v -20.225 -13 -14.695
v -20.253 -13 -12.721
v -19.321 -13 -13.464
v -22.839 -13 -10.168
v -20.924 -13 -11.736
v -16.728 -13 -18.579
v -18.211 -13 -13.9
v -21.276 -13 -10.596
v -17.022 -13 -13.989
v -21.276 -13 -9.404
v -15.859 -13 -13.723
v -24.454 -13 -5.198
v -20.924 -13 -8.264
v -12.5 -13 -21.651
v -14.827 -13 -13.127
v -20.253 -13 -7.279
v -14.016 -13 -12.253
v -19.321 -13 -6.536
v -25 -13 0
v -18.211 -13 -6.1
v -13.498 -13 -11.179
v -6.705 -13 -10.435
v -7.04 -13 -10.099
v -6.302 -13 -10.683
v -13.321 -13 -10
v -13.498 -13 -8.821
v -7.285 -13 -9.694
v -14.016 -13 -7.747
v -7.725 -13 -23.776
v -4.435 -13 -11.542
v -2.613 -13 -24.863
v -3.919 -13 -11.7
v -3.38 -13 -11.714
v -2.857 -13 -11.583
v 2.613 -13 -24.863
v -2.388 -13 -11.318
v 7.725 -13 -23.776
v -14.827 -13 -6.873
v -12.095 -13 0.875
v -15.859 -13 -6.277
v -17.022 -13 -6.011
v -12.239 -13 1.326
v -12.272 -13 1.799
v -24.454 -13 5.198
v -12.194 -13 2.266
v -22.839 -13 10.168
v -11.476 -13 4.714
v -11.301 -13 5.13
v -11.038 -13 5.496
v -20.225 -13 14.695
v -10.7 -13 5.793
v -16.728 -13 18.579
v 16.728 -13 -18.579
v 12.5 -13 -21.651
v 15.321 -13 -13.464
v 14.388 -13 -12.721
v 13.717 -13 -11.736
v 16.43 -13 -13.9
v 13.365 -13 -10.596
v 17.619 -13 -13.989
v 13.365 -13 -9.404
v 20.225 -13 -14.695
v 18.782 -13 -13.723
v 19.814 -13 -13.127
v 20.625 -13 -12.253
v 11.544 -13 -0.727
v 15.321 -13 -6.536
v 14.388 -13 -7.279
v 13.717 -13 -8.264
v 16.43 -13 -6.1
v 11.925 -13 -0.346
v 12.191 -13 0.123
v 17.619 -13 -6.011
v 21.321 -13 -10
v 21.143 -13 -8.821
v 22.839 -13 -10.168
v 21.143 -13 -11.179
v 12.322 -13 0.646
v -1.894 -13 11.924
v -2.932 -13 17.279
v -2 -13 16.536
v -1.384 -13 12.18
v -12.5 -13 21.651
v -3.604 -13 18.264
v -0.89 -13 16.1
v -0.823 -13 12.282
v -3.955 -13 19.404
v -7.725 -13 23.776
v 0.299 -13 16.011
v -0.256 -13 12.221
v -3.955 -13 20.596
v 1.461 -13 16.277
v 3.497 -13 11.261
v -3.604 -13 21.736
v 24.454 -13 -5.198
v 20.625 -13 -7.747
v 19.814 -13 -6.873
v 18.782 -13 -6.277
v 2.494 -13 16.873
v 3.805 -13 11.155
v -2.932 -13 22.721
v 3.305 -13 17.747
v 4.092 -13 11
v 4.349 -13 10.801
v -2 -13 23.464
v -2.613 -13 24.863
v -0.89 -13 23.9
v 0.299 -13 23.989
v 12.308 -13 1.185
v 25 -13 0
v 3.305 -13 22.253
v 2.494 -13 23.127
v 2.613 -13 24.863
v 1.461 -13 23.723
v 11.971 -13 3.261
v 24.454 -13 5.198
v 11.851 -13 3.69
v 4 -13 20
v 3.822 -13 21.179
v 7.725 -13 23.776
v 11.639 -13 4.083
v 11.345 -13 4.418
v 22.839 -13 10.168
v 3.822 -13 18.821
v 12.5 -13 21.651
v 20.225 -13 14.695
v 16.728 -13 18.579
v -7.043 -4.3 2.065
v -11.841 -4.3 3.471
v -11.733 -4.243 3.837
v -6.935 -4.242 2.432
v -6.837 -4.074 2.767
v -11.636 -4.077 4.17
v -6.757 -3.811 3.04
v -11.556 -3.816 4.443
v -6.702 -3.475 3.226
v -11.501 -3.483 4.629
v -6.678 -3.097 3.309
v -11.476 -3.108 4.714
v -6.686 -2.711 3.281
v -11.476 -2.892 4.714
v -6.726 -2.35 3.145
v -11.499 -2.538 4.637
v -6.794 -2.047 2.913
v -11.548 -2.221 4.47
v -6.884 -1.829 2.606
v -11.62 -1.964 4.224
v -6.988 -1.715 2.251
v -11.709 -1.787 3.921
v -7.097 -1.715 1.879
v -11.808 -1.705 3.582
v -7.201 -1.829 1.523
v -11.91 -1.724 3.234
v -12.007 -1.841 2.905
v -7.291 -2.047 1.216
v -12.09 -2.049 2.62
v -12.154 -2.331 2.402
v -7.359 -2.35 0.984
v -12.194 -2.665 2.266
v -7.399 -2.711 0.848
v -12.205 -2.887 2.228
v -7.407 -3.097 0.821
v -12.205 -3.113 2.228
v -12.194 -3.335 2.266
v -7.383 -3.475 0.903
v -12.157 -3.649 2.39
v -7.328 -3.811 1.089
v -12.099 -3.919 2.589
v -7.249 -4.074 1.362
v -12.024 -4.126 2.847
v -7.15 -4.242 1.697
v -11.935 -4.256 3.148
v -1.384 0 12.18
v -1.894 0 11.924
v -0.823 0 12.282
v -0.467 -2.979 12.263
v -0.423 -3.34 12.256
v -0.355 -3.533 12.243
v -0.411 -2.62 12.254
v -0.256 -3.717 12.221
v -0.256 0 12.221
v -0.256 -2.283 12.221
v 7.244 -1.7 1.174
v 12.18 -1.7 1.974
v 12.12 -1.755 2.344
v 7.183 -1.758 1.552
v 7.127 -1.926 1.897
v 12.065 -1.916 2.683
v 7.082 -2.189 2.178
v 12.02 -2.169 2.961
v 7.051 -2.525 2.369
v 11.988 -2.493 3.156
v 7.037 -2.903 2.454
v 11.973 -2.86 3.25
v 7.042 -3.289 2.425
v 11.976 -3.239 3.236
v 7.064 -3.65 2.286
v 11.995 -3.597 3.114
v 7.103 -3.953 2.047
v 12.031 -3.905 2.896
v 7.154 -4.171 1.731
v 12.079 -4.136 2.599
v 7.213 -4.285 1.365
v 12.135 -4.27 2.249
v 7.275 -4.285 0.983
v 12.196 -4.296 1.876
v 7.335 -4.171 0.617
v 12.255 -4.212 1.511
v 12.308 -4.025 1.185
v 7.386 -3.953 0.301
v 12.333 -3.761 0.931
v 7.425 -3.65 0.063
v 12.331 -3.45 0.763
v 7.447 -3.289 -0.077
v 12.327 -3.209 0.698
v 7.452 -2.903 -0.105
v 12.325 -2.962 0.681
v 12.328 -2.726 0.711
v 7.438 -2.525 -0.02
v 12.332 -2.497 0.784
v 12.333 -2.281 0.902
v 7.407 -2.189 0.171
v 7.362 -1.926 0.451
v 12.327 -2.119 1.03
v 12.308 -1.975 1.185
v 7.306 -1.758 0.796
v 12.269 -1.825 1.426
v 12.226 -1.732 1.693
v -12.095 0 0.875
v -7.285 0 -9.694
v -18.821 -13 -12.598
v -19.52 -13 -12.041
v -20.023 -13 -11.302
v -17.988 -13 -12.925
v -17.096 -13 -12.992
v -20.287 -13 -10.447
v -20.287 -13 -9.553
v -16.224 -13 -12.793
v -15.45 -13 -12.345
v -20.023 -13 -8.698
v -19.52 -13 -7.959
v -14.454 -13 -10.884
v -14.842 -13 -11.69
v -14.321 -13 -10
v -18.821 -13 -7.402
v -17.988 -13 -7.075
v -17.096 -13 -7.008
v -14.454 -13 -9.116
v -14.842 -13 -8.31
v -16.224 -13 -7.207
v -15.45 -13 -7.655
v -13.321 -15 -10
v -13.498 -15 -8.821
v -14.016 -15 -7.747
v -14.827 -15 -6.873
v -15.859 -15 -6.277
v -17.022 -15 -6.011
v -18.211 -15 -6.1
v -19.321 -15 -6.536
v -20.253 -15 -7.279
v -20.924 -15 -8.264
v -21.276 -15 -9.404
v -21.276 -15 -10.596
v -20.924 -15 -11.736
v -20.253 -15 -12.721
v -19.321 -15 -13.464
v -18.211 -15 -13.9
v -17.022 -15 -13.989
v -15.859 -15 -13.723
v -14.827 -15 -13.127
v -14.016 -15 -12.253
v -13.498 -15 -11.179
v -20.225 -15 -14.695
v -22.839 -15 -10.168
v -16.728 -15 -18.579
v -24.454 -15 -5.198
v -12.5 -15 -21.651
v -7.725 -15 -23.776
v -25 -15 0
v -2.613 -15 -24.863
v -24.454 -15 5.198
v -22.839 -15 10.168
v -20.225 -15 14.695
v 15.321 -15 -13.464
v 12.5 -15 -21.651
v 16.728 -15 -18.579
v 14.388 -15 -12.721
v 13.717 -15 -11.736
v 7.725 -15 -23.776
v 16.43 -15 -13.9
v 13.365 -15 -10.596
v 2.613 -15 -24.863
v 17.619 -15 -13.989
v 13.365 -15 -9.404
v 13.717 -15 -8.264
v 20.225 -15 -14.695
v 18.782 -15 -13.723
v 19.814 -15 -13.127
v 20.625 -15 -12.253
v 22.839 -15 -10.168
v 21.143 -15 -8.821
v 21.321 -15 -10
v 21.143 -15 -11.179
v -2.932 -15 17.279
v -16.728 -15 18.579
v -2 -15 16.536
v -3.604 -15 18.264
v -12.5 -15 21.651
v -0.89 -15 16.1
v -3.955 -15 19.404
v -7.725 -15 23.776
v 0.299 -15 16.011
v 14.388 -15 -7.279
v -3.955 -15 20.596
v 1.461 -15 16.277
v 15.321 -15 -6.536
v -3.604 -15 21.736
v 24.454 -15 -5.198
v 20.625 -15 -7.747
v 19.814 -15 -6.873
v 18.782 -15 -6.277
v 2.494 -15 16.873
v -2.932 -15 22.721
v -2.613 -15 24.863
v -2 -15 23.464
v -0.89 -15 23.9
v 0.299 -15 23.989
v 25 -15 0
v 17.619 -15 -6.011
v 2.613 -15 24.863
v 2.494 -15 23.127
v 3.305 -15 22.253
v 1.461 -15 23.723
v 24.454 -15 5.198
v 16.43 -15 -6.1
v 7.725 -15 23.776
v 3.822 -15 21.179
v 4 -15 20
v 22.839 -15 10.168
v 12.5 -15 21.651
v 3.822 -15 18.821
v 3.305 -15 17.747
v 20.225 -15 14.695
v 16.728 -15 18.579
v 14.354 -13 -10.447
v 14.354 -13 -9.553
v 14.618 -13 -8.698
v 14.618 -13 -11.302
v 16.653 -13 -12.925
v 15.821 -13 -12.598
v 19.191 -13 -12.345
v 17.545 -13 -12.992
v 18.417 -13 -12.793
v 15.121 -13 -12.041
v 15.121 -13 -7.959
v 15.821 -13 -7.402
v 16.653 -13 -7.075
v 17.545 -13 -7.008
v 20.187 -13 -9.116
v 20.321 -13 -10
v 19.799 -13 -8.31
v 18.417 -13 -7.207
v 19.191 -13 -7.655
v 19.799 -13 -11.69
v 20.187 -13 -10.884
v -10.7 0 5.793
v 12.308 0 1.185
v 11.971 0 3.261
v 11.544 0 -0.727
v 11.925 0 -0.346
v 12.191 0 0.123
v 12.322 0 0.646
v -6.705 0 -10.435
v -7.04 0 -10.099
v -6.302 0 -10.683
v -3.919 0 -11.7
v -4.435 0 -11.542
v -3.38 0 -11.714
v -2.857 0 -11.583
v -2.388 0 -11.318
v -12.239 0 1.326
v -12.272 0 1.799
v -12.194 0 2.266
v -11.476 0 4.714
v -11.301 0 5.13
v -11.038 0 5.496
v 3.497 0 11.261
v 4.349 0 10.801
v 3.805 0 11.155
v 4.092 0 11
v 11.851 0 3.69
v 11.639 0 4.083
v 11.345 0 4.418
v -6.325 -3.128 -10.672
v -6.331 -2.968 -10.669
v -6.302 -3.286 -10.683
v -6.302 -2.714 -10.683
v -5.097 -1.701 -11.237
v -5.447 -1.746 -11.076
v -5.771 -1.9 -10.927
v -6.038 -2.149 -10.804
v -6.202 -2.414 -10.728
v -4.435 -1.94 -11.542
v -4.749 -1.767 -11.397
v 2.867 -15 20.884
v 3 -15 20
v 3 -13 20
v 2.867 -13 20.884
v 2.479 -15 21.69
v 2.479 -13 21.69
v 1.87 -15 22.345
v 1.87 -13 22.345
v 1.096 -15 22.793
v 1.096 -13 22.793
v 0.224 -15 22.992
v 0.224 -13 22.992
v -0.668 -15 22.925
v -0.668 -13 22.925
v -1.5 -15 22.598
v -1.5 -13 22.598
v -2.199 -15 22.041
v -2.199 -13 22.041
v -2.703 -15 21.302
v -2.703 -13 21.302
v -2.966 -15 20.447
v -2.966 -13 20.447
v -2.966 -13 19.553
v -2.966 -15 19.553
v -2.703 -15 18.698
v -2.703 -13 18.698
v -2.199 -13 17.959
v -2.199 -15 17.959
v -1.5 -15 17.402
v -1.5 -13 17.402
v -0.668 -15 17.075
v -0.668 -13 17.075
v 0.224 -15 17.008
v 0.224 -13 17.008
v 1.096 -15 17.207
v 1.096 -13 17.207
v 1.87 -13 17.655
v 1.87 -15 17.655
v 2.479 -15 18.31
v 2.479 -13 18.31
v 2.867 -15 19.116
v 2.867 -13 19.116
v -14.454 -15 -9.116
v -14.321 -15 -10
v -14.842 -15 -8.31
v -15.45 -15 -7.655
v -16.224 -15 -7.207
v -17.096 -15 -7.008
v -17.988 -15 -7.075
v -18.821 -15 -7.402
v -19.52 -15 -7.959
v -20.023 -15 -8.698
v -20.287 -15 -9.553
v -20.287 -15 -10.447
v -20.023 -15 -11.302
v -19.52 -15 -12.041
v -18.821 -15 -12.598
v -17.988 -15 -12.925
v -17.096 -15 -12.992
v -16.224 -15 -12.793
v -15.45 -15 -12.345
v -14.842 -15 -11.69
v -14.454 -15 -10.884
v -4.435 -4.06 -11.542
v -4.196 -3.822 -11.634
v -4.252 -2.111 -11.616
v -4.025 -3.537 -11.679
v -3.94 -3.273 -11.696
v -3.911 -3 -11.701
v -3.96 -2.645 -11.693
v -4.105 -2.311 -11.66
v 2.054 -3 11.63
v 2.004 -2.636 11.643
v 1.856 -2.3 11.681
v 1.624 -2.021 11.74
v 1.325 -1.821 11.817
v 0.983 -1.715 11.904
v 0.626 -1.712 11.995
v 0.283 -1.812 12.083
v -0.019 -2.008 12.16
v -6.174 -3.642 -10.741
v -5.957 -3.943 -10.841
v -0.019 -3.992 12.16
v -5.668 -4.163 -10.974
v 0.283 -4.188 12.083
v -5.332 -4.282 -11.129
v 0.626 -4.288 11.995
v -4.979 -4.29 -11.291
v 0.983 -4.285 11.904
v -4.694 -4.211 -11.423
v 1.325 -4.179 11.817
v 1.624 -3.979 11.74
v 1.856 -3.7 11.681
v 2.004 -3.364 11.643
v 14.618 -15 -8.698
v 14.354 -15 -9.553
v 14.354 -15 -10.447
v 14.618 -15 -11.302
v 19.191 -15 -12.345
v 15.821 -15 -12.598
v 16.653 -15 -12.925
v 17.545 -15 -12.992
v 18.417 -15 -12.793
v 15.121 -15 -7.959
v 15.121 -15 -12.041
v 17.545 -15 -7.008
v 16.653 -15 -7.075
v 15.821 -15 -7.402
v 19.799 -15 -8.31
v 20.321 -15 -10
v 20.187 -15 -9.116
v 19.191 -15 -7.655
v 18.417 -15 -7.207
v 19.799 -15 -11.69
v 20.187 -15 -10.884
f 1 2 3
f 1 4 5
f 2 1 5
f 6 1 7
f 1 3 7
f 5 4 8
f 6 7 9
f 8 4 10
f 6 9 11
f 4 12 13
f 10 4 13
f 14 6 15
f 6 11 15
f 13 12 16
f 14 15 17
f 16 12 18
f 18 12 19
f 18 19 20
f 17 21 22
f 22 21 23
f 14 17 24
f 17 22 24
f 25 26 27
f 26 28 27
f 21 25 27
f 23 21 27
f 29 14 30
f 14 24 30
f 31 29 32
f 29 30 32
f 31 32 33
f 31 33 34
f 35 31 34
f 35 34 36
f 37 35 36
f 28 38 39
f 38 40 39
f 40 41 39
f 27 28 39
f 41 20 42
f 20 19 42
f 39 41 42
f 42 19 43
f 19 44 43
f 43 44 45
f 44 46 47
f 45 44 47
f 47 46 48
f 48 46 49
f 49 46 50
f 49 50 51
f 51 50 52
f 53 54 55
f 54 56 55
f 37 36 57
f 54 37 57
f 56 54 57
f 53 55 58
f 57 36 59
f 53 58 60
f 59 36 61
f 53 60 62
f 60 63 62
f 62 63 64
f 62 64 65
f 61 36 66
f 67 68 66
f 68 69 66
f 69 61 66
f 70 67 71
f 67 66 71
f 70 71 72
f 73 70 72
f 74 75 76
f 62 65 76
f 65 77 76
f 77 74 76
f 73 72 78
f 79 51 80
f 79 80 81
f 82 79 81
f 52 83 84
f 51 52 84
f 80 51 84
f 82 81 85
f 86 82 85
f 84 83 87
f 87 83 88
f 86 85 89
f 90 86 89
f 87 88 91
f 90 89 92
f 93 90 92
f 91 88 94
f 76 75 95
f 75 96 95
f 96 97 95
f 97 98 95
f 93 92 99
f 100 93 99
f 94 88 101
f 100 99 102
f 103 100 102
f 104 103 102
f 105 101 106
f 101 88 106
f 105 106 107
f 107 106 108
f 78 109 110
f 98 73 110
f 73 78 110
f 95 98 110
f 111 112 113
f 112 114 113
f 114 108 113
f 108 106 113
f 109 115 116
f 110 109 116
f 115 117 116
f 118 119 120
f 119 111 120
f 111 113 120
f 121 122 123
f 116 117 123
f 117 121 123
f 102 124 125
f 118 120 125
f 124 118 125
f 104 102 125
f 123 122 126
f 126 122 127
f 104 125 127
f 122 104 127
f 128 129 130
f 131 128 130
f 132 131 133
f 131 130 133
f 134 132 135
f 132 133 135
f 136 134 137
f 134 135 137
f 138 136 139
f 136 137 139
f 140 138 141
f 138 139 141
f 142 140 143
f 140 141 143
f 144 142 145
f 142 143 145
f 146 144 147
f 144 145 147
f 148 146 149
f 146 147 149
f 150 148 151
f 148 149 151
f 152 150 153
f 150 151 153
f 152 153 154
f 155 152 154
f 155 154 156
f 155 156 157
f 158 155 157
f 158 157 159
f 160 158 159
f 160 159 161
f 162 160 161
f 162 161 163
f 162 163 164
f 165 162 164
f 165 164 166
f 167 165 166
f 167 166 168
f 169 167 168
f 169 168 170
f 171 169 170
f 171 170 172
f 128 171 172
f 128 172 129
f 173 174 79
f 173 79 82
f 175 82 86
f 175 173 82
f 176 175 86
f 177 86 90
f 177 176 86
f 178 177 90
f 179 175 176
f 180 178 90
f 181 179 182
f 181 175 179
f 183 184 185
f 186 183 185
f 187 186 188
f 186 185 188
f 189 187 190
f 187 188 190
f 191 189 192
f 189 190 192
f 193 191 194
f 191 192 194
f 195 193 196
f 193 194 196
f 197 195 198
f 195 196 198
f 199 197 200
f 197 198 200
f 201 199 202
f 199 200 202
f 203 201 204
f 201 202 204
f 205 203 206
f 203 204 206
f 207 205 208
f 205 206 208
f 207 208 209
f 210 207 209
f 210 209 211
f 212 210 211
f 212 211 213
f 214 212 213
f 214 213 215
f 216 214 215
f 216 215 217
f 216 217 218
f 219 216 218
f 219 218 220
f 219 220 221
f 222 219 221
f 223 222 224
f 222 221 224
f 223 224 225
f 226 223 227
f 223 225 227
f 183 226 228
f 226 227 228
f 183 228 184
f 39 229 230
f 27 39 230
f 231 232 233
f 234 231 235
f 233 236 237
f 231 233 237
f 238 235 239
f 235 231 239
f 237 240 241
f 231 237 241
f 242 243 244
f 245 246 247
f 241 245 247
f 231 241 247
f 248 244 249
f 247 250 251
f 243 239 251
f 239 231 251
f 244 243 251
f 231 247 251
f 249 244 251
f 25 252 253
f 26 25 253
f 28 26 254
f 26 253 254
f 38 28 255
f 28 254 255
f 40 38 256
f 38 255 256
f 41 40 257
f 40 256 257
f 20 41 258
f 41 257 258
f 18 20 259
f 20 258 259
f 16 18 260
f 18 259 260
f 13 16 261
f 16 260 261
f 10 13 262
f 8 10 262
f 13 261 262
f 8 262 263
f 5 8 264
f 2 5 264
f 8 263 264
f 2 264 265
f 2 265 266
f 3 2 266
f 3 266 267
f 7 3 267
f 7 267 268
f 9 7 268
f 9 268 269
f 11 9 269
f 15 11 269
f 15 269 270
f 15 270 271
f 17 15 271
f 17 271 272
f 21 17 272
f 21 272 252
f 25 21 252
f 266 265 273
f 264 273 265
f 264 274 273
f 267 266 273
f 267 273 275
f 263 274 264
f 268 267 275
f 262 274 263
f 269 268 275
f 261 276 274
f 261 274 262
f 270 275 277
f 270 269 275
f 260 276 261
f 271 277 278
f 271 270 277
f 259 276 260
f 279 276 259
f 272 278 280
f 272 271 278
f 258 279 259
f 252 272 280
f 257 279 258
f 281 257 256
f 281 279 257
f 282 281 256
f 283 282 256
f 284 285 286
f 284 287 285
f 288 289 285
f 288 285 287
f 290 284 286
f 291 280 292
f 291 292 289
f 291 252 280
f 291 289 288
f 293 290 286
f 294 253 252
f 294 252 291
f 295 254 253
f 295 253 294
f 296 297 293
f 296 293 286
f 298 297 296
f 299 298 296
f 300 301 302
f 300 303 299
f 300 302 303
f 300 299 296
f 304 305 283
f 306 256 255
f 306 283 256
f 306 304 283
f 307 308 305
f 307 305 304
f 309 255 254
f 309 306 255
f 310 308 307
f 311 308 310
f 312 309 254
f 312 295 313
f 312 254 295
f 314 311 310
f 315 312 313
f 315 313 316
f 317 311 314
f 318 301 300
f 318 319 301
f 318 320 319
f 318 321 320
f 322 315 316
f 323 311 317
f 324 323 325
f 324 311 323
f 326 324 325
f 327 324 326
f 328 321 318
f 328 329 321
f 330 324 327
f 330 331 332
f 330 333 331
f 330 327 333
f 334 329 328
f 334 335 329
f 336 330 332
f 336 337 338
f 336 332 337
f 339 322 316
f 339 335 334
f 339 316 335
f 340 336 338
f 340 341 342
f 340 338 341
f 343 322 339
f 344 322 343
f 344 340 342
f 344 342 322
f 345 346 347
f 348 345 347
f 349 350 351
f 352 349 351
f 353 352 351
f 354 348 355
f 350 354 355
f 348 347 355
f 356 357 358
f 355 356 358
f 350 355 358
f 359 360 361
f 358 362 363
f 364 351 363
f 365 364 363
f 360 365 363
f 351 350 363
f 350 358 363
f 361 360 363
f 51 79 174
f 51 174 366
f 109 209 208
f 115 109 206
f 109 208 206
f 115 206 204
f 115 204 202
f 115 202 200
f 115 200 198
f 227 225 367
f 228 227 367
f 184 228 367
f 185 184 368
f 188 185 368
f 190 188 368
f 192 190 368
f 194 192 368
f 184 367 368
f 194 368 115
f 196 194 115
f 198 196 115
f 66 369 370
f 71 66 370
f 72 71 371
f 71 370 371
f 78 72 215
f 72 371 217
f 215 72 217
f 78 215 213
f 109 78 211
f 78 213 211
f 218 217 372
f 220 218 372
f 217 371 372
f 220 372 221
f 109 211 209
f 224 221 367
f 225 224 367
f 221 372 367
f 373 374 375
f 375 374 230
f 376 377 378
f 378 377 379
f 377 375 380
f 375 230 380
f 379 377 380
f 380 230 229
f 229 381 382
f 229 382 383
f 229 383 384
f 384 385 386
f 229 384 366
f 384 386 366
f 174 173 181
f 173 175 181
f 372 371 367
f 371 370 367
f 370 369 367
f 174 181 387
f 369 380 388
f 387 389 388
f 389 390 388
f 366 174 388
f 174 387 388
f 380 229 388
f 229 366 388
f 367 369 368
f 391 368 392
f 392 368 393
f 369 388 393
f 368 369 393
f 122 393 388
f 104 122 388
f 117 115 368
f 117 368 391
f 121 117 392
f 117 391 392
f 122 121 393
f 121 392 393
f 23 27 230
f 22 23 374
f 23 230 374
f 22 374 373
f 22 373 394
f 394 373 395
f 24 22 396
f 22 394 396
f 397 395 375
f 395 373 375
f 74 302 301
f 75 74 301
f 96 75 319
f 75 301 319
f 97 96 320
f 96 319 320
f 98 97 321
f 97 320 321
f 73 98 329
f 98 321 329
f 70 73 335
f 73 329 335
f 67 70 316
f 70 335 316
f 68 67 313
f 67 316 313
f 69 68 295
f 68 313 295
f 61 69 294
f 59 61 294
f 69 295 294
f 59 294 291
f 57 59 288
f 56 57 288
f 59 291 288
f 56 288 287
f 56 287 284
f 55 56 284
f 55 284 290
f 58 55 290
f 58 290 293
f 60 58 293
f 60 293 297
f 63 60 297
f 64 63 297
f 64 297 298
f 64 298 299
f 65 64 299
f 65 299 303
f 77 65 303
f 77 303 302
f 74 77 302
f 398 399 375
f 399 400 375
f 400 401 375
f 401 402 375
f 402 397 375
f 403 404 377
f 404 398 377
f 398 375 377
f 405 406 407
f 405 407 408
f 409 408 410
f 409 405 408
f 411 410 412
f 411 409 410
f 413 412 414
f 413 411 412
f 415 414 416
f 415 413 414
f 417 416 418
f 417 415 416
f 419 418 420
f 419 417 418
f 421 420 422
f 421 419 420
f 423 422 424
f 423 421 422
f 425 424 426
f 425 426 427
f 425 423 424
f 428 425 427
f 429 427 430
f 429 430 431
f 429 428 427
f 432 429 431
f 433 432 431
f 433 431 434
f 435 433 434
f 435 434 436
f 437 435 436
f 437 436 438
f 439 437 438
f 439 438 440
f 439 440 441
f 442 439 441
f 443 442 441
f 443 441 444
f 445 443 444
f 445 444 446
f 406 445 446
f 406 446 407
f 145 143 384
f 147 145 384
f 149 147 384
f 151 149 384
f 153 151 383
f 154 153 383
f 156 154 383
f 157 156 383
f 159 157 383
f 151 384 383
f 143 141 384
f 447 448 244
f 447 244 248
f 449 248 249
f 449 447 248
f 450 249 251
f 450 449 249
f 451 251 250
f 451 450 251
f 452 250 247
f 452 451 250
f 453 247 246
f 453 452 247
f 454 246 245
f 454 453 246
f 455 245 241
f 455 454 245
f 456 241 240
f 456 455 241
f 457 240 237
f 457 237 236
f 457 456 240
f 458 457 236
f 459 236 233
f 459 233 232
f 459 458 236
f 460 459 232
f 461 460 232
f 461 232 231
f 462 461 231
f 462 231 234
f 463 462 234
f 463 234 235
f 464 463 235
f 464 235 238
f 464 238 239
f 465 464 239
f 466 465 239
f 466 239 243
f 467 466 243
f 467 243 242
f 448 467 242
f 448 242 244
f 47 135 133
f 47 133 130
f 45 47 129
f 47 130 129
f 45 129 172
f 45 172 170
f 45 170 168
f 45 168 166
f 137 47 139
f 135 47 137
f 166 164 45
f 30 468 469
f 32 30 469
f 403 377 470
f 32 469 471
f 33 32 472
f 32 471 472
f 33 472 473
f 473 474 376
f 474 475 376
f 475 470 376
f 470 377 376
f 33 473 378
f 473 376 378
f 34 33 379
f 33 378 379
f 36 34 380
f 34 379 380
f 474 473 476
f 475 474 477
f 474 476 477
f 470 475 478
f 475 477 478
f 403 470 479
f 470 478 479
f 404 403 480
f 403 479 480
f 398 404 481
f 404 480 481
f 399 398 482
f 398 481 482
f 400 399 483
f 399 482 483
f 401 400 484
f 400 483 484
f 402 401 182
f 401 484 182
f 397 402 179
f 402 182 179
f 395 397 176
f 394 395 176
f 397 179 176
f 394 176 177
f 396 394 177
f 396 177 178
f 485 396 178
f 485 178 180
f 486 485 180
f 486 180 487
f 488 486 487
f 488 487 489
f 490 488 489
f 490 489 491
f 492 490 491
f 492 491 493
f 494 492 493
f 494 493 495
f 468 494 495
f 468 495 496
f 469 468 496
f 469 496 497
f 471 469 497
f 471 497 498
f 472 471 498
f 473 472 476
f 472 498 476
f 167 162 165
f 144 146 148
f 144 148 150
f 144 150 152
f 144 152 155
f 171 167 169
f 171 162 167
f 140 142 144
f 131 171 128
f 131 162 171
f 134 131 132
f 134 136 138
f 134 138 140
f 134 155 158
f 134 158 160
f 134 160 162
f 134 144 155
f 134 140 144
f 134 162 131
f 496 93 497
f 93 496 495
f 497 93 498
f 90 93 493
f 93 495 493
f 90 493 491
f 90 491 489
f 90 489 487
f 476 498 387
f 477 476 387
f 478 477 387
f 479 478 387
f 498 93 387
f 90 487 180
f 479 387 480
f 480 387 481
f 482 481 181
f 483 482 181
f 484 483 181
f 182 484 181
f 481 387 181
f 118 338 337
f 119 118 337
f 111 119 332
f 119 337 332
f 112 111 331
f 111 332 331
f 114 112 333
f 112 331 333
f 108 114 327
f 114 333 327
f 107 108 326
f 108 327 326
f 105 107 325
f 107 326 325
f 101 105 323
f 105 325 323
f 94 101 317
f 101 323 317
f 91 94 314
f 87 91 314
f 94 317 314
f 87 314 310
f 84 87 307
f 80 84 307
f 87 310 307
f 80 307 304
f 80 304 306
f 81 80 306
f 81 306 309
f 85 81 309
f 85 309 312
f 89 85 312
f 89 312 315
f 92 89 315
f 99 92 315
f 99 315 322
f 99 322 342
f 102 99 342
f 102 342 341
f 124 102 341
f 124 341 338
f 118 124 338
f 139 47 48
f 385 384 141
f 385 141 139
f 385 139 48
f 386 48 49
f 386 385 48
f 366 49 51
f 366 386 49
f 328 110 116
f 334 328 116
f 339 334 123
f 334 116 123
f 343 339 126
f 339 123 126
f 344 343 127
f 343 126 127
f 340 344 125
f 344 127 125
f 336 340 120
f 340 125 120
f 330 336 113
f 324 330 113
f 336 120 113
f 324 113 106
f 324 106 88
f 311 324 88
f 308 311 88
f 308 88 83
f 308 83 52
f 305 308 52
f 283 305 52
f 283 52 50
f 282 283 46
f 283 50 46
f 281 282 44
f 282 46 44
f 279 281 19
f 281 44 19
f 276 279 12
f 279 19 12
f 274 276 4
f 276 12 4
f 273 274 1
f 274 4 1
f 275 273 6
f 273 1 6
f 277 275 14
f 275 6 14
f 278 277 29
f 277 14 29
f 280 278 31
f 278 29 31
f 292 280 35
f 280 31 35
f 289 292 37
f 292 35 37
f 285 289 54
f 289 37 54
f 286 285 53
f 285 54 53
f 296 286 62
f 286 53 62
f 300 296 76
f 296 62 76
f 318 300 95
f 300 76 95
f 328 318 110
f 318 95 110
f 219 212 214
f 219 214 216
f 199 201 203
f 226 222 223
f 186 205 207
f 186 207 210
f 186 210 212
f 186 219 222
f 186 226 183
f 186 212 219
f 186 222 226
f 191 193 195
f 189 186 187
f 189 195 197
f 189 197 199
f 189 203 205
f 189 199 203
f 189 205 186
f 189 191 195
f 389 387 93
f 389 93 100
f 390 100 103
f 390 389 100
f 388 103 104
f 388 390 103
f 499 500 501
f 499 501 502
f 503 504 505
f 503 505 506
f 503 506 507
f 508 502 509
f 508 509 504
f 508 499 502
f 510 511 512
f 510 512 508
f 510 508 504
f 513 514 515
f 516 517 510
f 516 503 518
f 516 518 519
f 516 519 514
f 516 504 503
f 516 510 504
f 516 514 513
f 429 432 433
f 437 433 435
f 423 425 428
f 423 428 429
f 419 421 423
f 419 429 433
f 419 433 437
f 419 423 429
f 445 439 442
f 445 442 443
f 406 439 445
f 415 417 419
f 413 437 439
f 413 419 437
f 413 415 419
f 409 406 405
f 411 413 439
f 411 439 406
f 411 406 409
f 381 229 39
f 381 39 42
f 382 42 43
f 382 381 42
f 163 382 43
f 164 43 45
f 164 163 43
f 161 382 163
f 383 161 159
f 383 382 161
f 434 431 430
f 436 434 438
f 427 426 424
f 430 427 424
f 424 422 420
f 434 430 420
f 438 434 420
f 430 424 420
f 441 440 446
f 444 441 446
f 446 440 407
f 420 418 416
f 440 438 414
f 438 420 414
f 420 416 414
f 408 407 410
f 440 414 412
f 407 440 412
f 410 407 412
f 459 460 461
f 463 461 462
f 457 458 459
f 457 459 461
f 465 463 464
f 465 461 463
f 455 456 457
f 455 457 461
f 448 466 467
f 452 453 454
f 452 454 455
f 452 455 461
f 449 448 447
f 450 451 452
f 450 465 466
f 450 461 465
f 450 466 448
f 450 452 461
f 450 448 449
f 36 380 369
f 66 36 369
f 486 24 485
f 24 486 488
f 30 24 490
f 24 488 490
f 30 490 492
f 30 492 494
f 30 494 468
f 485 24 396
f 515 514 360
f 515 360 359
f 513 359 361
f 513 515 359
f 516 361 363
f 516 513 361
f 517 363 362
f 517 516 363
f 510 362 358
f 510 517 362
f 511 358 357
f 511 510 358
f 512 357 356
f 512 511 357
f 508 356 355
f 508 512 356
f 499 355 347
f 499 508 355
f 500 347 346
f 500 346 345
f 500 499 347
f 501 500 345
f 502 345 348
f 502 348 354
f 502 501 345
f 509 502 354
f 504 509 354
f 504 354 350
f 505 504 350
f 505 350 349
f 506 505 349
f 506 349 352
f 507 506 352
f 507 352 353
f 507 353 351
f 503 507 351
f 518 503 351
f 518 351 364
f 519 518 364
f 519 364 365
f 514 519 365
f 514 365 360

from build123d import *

# Parameters (mm, degrees)
F1_DEPTH      = 13
F2_R          = 1.3
F3_DEPTH      = 5
F4_R          = 1.3
F5_DEPTH      = 25
F6_R          = 1.3
F7_DEPTH      = 5
F8_R          = 25
F9_DEPTH      = 2
F10_R         = 4
F10_R_2       = 3
F11_DEPTH     = 80
F12_T1_DEPTH  = 16.002243982
F12_T3_DEPTH  = 14.8598729542
F12_T5_DEPTH  = 14.7613040686
F12_T7_DEPTH  = 15.2887647241
F12_T9_DEPTH  = 14.7419723435
F12_T11_DEPTH = 14.2482473807


# Not quite as in the source:
# - a fillet or chamfer that OpenCascade refuses, or shapes differently, is made with other operations: its cross-section is extruded or revolved along the edge and cut away or added


with BuildPart() as f1:
    # F0 (on Front) → F1 (new body)
    with BuildSketch(Plane.XZ):
        Polygon((-3.34402165, -12.0443978349), (12.5, 0), (11.86, 3.9484680574), (3.9804532583, 11.1376835822), (-1.1429031284, 12.44764124), (-11.2779609495, 5.390509885), (-12.4032698364, 1.552062294), (-6.9773613512, -10.3714236522), align=None)
    extrude(amount=F1_DEPTH)

    # F2 (on face) → F3 (cut)
    with BuildSketch(Plane(origin=(12.18, 0, 1.9742340287), x_dir=(0, 1, 0), z_dir=(0.9871170143, 0, 0.16))):
        with Locations((-3, 0)):
            Circle(F2_R)
    extrude(amount=-F3_DEPTH, mode=Mode.SUBTRACT)

    # F4 (on face) → F5 (cut)
    with BuildSketch(Plane(origin=(2.9172291114, 0, 11.4095324461), x_dir=(0.9688330447, 0, -0.2477146172), z_dir=(0.2477146172, 0, 0.9688330447))):
        with Locations((-2.1907450021, -3)):
            Circle(F4_R)
    extrude(amount=-F5_DEPTH, mode=Mode.SUBTRACT)

    # F6 (on face) → F7 (cut)
    with BuildSketch(Plane(origin=(-11.840615393, 0, 3.4712860895), x_dir=(0, -1, 0), z_dir=(-0.9596118978, 0, 0.2813272217))):
        with Locations((3, 0)):
            Circle(F6_R)
    extrude(amount=-F7_DEPTH, mode=Mode.SUBTRACT)

    # F8 (on face) → F9 (join)
    with BuildSketch(Plane.XZ.offset(13)):
        Circle(F8_R)
    extrude(amount=F9_DEPTH)

    # F10 (on face) → F11 (cut)
    with BuildSketch(Plane.XZ.offset(15)):
        with Locations((0, 20)):
            Circle(F10_R)
        with Locations((0, 20)):
            Circle(F10_R_2, mode=Mode.SUBTRACT)
        with Locations((17.3205080757, -10)):
            Circle(F10_R)
        with Locations((17.3205080757, -10)):
            Circle(F10_R_2, mode=Mode.SUBTRACT)
        with Locations((-17.3205080757, -10)):
            Circle(F10_R)
        with Locations((-17.3205080757, -10)):
            Circle(F10_R_2, mode=Mode.SUBTRACT)
    extrude(amount=-F11_DEPTH, mode=Mode.SUBTRACT)

    # F12: fillet of radius 2 on 8 edges, made by hand

    # F12_s2 → F12_t1 (cut)
    with BuildSketch(Plane.XZ.offset(-3.002243982)):
        with BuildLine():
            ThreePointArc((-4.4348388753, -11.5421301677), (-3.3803086774, -11.7135390891), (-2.3879978952, -11.3176422991))
            Line((-2.3879978952, -11.3176422991), (-3.34402165, -12.0443978349))
            Line((-3.34402165, -12.0443978349), (-4.4348388753, -11.5421301677))
        make_face()
        with BuildLine():
            ThreePointArc((11.5439762452, -0.7267555357), (12.1909080195, 0.1234763362), (12.3078563852, 1.1854264463))
            Line((12.3078563852, 1.1854264463), (12.5, 0))
            Line((12.5, 0), (11.5439762452, -0.7267555357))
        make_face()
    extrude(amount=F12_T1_DEPTH, mode=Mode.SUBTRACT)

    # F12_s4 → F12_t3 (cut)
    with BuildSketch(Plane.XZ.offset(-1.8598729542)):
        with BuildLine():
            ThreePointArc((-7.2854987693, -9.69428872), (-6.8824804468, -10.2769646373), (-6.3016063269, -10.6825755958))
            Line((-6.3016063269, -10.6825755958), (-6.9773613512, -10.3714236522))
            Line((-6.9773613512, -10.3714236522), (-7.2854987693, -9.69428872))
        make_face()
        with BuildLine():
            ThreePointArc((-12.0951324183, 0.8749273617), (-12.2697226938, 1.5615518796), (-12.1939766801, 2.26596478))
            Line((-12.1939766801, 2.26596478), (-12.4032698364, 1.552062294))
            Line((-12.4032698364, 1.552062294), (-12.0951324183, 0.8749273617))
        make_face()
    extrude(amount=F12_T3_DEPTH, mode=Mode.SUBTRACT)

    # F12_s6 → F12_t5 (cut)
    with BuildSketch(Plane.XZ.offset(-1.7613040686)):
        with BuildLine():
            ThreePointArc((-11.4761620616, 4.7144425491), (-11.1801923355, 5.320140033), (-10.6997935463, 5.793093016))
            Line((-10.6997935463, 5.793093016), (-11.2779609495, 5.390509885))
            Line((-11.2779609495, 5.390509885), (-11.4761620616, 4.7144425491))
        make_face()
    extrude(amount=F12_T5_DEPTH, mode=Mode.SUBTRACT)

    # F12_s8 → F12_t7 (cut)
    with BuildSketch(Plane.XZ.offset(-2.2887647241)):
        with BuildLine():
            ThreePointArc((-1.8942152844, 11.92449587), (-1.1073763077, 12.2512489852), (-0.2559307699, 12.220857049))
            Line((-0.2559307699, 12.220857049), (-1.1429031284, 12.44764124))
            Line((-1.1429031284, 12.44764124), (-1.8942152844, 11.92449587))
        make_face()
    extrude(amount=F12_T7_DEPTH, mode=Mode.SUBTRACT)

    # F12_s10 → F12_t9 (cut)
    with BuildSketch(Plane.XZ.offset(-1.7419723435)):
        with BuildLine():
            ThreePointArc((11.97148623, 3.2606558419), (11.7563010761, 3.8923632844), (11.345263885, 4.4181078717))
            Line((11.345263885, 4.4181078717), (11.86, 3.9484680574))
            Line((11.86, 3.9484680574), (11.97148623, 3.2606558419))
        make_face()
    extrude(amount=F12_T9_DEPTH, mode=Mode.SUBTRACT)

    # F12_s12 → F12_t11 (cut)
    with BuildSketch(Plane.XZ.offset(-1.2482473807)):
        with BuildLine():
            ThreePointArc((3.4967159342, 11.261367231), (3.9512960944, 11.0836676613), (4.3492983836, 10.8011531715))
            Line((4.3492983836, 10.8011531715), (3.9804532583, 11.1376835822))
            Line((3.9804532583, 11.1376835822), (3.4967159342, 11.261367231))
        make_face()
    extrude(amount=F12_T11_DEPTH, mode=Mode.SUBTRACT)


solid = f1.part
